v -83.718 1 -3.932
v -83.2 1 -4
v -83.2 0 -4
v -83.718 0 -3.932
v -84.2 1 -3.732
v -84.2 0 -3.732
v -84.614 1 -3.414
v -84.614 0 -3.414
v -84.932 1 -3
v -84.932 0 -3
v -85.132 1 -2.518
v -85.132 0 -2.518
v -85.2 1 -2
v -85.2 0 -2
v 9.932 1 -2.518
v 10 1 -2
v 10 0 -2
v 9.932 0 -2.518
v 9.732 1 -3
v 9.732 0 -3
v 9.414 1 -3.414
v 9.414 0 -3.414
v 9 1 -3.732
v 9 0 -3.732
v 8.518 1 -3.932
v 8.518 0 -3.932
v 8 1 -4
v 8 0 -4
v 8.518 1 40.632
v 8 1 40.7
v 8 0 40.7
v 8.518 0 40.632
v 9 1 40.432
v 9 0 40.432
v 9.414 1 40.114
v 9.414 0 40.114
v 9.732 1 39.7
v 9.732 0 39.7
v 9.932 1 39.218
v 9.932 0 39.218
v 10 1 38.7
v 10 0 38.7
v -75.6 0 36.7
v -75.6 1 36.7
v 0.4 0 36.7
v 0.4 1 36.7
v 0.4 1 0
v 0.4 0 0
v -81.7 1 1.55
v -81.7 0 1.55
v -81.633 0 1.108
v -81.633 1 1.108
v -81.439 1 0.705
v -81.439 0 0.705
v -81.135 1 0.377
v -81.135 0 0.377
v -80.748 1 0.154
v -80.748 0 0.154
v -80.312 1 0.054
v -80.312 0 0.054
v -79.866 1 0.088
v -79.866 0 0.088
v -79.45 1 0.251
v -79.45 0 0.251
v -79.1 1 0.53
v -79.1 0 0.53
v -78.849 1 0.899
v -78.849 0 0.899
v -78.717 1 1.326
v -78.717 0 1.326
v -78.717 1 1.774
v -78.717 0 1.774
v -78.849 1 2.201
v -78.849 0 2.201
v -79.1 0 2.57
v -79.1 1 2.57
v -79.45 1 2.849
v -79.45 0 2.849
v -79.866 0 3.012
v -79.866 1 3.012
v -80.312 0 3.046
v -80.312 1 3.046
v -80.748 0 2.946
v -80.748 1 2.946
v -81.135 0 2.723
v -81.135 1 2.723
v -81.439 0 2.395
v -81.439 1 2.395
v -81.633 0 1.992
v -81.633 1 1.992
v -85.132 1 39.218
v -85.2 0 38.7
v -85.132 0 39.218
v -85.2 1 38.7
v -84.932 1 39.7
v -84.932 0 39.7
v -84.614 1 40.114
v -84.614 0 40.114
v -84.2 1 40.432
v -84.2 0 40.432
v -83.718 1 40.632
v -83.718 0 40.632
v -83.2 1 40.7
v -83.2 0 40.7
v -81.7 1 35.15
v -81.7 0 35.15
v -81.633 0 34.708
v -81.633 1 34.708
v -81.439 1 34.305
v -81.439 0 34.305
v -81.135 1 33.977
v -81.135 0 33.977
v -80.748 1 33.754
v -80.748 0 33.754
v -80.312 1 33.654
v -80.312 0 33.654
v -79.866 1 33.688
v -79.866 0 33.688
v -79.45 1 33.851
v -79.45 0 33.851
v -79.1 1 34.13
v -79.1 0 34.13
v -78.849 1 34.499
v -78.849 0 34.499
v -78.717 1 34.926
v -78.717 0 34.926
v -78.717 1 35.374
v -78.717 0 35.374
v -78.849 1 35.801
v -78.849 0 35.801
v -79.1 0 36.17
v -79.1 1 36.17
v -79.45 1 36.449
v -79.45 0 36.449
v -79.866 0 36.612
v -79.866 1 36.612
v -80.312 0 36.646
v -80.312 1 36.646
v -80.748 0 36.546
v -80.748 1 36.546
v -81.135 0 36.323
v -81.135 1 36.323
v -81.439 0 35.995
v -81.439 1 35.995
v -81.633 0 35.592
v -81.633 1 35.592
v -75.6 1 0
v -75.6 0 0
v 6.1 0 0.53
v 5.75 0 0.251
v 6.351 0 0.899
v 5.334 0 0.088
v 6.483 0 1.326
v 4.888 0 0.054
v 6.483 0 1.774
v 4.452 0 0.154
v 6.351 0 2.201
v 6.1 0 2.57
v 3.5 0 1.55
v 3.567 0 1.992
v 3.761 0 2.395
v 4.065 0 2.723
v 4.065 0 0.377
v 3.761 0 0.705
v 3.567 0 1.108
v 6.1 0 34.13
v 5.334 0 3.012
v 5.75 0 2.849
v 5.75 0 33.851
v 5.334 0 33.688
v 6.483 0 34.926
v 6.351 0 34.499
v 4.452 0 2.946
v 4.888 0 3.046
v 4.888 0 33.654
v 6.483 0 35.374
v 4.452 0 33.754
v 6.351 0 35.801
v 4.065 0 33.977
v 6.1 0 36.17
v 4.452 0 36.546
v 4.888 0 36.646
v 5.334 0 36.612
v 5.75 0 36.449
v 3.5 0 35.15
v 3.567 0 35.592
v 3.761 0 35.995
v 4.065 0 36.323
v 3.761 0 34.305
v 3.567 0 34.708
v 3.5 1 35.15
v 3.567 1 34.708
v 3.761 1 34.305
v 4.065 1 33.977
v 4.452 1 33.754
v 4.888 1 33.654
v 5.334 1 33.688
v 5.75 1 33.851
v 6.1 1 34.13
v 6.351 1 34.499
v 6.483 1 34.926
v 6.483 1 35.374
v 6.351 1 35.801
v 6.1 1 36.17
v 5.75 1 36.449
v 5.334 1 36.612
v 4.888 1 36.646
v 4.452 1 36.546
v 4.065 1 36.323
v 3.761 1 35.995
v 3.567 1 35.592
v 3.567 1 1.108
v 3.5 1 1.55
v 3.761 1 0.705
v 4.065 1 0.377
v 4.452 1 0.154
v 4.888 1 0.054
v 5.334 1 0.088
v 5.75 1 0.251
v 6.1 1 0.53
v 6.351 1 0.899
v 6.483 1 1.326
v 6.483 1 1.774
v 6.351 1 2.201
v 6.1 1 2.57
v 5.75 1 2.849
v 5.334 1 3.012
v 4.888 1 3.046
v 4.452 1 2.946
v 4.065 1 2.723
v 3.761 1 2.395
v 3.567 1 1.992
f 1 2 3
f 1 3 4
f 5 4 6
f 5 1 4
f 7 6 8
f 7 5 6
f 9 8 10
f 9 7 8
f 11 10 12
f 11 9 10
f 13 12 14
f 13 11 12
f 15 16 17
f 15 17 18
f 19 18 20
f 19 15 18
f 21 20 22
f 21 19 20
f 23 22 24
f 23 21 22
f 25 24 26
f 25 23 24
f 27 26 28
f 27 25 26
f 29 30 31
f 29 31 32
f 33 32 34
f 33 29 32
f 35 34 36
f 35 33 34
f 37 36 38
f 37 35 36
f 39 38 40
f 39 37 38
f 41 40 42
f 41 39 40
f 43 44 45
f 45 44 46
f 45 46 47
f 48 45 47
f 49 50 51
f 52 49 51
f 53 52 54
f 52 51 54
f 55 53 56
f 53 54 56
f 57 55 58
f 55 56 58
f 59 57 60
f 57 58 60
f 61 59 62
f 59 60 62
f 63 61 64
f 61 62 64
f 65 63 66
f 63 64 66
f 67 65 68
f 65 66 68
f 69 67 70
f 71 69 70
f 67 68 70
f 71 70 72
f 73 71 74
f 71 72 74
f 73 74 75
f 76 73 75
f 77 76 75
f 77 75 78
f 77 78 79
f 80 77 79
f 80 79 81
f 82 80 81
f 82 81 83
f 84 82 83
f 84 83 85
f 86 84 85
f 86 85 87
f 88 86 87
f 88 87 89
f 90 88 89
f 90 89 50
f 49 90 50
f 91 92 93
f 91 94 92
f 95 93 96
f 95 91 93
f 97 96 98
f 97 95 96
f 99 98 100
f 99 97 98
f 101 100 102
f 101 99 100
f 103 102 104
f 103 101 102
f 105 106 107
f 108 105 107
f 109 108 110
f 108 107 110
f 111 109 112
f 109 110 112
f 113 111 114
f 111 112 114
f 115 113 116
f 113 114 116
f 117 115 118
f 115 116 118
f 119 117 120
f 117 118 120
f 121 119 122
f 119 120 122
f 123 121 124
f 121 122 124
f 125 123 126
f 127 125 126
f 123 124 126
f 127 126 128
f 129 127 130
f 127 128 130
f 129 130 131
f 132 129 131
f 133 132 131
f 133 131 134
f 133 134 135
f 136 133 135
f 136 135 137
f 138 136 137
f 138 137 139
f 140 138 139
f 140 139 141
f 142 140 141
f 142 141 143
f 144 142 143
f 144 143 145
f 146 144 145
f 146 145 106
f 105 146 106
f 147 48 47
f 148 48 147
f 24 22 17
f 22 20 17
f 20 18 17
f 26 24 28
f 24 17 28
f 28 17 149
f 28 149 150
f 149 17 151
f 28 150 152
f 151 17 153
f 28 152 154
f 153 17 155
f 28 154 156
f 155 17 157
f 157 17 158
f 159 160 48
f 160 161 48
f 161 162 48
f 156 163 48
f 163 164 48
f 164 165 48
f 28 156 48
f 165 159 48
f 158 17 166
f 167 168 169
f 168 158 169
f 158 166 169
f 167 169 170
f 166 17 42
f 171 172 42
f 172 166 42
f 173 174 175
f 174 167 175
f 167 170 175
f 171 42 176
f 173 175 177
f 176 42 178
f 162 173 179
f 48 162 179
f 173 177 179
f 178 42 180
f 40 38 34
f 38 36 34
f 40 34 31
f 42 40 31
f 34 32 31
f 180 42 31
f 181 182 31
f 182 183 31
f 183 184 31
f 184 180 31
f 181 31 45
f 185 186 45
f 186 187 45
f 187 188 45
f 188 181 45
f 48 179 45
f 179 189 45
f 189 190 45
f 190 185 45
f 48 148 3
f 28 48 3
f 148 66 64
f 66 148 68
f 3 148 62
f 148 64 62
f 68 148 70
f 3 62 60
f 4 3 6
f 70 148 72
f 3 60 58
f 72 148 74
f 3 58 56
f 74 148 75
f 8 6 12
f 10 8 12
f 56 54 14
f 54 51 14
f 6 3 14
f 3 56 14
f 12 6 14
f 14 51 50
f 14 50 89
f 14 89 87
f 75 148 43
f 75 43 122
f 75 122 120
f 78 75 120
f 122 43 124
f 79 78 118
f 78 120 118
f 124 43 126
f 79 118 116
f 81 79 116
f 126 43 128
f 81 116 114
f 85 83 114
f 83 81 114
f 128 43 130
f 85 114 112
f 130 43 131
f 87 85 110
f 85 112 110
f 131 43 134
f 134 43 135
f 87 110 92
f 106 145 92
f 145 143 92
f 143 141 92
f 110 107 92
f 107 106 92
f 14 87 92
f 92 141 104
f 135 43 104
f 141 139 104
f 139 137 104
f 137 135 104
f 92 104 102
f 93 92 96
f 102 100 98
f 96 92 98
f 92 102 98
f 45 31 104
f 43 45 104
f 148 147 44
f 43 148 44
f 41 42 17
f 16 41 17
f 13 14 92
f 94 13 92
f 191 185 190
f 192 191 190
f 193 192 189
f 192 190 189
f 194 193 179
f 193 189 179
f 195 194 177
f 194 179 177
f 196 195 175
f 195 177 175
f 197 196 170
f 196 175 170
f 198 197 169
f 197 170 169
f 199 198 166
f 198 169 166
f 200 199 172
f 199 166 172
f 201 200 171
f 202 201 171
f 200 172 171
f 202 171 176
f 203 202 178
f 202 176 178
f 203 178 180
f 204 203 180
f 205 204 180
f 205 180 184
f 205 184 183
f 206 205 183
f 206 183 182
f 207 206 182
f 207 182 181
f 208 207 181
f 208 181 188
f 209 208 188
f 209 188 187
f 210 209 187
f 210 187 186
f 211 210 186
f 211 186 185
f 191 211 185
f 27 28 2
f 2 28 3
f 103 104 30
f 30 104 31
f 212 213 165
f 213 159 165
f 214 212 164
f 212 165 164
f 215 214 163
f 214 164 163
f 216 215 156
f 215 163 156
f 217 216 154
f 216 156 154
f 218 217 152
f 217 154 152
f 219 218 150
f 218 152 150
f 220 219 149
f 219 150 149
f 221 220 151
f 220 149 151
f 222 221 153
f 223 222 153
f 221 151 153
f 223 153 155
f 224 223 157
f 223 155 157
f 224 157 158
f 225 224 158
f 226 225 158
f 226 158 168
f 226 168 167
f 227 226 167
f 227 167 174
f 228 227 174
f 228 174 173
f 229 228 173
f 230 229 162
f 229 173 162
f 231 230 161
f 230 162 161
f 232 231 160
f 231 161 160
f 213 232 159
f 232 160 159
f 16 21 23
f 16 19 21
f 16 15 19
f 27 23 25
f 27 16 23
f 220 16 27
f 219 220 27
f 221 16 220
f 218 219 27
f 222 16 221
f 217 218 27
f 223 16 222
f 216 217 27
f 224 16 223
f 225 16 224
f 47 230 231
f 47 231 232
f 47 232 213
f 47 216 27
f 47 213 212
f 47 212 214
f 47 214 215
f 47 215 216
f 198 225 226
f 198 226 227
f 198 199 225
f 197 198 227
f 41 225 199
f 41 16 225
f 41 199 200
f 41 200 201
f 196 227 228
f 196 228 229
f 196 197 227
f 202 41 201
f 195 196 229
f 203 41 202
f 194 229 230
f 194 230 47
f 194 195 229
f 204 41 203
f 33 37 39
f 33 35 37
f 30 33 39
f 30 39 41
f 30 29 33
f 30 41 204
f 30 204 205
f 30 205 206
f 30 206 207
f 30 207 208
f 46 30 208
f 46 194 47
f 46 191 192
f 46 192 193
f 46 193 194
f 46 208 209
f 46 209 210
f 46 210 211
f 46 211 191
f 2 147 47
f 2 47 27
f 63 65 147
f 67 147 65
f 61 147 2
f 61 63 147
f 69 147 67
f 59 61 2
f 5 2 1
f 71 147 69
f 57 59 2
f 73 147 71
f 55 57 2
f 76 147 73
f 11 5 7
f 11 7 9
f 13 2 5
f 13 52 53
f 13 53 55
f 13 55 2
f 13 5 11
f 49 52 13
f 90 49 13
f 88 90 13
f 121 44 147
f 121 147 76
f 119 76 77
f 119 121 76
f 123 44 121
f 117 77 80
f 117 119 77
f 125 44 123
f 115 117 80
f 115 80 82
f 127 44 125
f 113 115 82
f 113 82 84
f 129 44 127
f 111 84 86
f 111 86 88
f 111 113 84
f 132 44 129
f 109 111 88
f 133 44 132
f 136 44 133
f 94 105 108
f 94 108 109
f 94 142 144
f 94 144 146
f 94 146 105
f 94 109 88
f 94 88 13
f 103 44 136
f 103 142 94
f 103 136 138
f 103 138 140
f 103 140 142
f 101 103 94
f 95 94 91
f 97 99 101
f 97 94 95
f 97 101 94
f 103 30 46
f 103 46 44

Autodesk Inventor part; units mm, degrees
ref_plane "YZ Plane" through (0, 0, 0) normal (1, 0, 0) x (0, 1, 0)
ref_plane "XZ Plane" through (0, 0, 0) normal (0, 1, 0) x (-1, 0, 0)
ref_plane "XY Plane" through (0, 0, 0) normal (0, 0, 1) x (1, 0, 0)
sketch "Эскиз1" plane through (0, 0, 0) normal (0, 1, 0) x (-1, 0, 0)
  line L0 (0, 0) -> (75.2, 0)
  line L1 (75.2, 0) -> (75.2, 36.7)
  line L2 (75.2, 36.7) -> (0, 36.7)
  line L3 (0, 36.7) -> (0, 0)
  line L4 (0, 0) -> (-10, 0)
  line L5 (-10, 0) -> (-10, -4)
  line L6 (-10, -4) -> (0, -4)
  line L7 (0, -4) -> (0, 0)
  line L8 (-10, -4) -> (85.2, -4)
  line L9 (85.2, -4) -> (85.2, 40.7)
  line L10 (85.2, 40.7) -> (-10, 40.7)
  line L11 (-10, 40.7) -> (-10, -4)
  line L12 (75.2, 36.7) -> (80.2, 36.7)
  line L13 (80.2, 36.7) -> (80.2, 0)
  line L14 (80.2, 0) -> (80.2, 36.7)
  line L15 (80.2, 36.7) -> (80.2, 35.15)
  line L16 (80.2, 0) -> (80.2, 1.55)
  line L17 (0, 0) -> (-5, 0)
  line L18 (-5, 0) -> (-5, 1.55)
  line L19 (-5, 1.55) -> (-5, 36.7)
  line L20 (-5, 36.7) -> (-5, 35.15)
  circle A0 centre (-5, 35.15) radius 1.5
  circle A1 centre (-5, 1.55) radius 1.5
  circle A2 centre (80.2, 35.15) radius 1.5
  circle A3 centre (80.2, 1.55) radius 1.5
  dimension "d0" = 75.2
  dimension "d1" = 36.7
  dimension "d2" = 10
  dimension "d3" = 4
  dimension "d4" = 95.2
  dimension "d5" = 44.7
  dimension "d6" = 5
  dimension "d7" = 1.55
  dimension "d8" = 1.55
  dimension "d9" = 5
  dimension "d10" = 1.55
  dimension "d11" = 1.55
  dimension "d12" = 3
  dimension "d13" = 3
  dimension "d14" = 3
  dimension "d15" = 3
extrude "Выдавливание1" add sketch "Эскиз1" along normal blind 1
fillet "Сопряжение1" radius 2 4 edges at (-85.2, 0.5, 40.7) (-85.2, 0.5, -4) (10, 0.5, -4) (10, 0.5, 40.7)
sketch "Эскиз2" plane through (0, 1, 0) normal (0, 1, 0) x (1, 0, 0)
  line L0 (0, 0) -> (0.4, 0)
  line L1 (0.4, 0) -> (-75.6, 0)
  line L2 (-75.6, 0) -> (-75.6, -36.7)
  line L3 (-75.6, -36.7) -> (0.4, -36.7)
  line L4 (0.4, -36.7) -> (0.4, 0)
  dimension "d19" = 0.4
  dimension "d20" = 76
extrude "Выдавливание2" cut sketch "Эскиз2" against normal blind 10
properties part number "metal_holder" material "Серебро"
